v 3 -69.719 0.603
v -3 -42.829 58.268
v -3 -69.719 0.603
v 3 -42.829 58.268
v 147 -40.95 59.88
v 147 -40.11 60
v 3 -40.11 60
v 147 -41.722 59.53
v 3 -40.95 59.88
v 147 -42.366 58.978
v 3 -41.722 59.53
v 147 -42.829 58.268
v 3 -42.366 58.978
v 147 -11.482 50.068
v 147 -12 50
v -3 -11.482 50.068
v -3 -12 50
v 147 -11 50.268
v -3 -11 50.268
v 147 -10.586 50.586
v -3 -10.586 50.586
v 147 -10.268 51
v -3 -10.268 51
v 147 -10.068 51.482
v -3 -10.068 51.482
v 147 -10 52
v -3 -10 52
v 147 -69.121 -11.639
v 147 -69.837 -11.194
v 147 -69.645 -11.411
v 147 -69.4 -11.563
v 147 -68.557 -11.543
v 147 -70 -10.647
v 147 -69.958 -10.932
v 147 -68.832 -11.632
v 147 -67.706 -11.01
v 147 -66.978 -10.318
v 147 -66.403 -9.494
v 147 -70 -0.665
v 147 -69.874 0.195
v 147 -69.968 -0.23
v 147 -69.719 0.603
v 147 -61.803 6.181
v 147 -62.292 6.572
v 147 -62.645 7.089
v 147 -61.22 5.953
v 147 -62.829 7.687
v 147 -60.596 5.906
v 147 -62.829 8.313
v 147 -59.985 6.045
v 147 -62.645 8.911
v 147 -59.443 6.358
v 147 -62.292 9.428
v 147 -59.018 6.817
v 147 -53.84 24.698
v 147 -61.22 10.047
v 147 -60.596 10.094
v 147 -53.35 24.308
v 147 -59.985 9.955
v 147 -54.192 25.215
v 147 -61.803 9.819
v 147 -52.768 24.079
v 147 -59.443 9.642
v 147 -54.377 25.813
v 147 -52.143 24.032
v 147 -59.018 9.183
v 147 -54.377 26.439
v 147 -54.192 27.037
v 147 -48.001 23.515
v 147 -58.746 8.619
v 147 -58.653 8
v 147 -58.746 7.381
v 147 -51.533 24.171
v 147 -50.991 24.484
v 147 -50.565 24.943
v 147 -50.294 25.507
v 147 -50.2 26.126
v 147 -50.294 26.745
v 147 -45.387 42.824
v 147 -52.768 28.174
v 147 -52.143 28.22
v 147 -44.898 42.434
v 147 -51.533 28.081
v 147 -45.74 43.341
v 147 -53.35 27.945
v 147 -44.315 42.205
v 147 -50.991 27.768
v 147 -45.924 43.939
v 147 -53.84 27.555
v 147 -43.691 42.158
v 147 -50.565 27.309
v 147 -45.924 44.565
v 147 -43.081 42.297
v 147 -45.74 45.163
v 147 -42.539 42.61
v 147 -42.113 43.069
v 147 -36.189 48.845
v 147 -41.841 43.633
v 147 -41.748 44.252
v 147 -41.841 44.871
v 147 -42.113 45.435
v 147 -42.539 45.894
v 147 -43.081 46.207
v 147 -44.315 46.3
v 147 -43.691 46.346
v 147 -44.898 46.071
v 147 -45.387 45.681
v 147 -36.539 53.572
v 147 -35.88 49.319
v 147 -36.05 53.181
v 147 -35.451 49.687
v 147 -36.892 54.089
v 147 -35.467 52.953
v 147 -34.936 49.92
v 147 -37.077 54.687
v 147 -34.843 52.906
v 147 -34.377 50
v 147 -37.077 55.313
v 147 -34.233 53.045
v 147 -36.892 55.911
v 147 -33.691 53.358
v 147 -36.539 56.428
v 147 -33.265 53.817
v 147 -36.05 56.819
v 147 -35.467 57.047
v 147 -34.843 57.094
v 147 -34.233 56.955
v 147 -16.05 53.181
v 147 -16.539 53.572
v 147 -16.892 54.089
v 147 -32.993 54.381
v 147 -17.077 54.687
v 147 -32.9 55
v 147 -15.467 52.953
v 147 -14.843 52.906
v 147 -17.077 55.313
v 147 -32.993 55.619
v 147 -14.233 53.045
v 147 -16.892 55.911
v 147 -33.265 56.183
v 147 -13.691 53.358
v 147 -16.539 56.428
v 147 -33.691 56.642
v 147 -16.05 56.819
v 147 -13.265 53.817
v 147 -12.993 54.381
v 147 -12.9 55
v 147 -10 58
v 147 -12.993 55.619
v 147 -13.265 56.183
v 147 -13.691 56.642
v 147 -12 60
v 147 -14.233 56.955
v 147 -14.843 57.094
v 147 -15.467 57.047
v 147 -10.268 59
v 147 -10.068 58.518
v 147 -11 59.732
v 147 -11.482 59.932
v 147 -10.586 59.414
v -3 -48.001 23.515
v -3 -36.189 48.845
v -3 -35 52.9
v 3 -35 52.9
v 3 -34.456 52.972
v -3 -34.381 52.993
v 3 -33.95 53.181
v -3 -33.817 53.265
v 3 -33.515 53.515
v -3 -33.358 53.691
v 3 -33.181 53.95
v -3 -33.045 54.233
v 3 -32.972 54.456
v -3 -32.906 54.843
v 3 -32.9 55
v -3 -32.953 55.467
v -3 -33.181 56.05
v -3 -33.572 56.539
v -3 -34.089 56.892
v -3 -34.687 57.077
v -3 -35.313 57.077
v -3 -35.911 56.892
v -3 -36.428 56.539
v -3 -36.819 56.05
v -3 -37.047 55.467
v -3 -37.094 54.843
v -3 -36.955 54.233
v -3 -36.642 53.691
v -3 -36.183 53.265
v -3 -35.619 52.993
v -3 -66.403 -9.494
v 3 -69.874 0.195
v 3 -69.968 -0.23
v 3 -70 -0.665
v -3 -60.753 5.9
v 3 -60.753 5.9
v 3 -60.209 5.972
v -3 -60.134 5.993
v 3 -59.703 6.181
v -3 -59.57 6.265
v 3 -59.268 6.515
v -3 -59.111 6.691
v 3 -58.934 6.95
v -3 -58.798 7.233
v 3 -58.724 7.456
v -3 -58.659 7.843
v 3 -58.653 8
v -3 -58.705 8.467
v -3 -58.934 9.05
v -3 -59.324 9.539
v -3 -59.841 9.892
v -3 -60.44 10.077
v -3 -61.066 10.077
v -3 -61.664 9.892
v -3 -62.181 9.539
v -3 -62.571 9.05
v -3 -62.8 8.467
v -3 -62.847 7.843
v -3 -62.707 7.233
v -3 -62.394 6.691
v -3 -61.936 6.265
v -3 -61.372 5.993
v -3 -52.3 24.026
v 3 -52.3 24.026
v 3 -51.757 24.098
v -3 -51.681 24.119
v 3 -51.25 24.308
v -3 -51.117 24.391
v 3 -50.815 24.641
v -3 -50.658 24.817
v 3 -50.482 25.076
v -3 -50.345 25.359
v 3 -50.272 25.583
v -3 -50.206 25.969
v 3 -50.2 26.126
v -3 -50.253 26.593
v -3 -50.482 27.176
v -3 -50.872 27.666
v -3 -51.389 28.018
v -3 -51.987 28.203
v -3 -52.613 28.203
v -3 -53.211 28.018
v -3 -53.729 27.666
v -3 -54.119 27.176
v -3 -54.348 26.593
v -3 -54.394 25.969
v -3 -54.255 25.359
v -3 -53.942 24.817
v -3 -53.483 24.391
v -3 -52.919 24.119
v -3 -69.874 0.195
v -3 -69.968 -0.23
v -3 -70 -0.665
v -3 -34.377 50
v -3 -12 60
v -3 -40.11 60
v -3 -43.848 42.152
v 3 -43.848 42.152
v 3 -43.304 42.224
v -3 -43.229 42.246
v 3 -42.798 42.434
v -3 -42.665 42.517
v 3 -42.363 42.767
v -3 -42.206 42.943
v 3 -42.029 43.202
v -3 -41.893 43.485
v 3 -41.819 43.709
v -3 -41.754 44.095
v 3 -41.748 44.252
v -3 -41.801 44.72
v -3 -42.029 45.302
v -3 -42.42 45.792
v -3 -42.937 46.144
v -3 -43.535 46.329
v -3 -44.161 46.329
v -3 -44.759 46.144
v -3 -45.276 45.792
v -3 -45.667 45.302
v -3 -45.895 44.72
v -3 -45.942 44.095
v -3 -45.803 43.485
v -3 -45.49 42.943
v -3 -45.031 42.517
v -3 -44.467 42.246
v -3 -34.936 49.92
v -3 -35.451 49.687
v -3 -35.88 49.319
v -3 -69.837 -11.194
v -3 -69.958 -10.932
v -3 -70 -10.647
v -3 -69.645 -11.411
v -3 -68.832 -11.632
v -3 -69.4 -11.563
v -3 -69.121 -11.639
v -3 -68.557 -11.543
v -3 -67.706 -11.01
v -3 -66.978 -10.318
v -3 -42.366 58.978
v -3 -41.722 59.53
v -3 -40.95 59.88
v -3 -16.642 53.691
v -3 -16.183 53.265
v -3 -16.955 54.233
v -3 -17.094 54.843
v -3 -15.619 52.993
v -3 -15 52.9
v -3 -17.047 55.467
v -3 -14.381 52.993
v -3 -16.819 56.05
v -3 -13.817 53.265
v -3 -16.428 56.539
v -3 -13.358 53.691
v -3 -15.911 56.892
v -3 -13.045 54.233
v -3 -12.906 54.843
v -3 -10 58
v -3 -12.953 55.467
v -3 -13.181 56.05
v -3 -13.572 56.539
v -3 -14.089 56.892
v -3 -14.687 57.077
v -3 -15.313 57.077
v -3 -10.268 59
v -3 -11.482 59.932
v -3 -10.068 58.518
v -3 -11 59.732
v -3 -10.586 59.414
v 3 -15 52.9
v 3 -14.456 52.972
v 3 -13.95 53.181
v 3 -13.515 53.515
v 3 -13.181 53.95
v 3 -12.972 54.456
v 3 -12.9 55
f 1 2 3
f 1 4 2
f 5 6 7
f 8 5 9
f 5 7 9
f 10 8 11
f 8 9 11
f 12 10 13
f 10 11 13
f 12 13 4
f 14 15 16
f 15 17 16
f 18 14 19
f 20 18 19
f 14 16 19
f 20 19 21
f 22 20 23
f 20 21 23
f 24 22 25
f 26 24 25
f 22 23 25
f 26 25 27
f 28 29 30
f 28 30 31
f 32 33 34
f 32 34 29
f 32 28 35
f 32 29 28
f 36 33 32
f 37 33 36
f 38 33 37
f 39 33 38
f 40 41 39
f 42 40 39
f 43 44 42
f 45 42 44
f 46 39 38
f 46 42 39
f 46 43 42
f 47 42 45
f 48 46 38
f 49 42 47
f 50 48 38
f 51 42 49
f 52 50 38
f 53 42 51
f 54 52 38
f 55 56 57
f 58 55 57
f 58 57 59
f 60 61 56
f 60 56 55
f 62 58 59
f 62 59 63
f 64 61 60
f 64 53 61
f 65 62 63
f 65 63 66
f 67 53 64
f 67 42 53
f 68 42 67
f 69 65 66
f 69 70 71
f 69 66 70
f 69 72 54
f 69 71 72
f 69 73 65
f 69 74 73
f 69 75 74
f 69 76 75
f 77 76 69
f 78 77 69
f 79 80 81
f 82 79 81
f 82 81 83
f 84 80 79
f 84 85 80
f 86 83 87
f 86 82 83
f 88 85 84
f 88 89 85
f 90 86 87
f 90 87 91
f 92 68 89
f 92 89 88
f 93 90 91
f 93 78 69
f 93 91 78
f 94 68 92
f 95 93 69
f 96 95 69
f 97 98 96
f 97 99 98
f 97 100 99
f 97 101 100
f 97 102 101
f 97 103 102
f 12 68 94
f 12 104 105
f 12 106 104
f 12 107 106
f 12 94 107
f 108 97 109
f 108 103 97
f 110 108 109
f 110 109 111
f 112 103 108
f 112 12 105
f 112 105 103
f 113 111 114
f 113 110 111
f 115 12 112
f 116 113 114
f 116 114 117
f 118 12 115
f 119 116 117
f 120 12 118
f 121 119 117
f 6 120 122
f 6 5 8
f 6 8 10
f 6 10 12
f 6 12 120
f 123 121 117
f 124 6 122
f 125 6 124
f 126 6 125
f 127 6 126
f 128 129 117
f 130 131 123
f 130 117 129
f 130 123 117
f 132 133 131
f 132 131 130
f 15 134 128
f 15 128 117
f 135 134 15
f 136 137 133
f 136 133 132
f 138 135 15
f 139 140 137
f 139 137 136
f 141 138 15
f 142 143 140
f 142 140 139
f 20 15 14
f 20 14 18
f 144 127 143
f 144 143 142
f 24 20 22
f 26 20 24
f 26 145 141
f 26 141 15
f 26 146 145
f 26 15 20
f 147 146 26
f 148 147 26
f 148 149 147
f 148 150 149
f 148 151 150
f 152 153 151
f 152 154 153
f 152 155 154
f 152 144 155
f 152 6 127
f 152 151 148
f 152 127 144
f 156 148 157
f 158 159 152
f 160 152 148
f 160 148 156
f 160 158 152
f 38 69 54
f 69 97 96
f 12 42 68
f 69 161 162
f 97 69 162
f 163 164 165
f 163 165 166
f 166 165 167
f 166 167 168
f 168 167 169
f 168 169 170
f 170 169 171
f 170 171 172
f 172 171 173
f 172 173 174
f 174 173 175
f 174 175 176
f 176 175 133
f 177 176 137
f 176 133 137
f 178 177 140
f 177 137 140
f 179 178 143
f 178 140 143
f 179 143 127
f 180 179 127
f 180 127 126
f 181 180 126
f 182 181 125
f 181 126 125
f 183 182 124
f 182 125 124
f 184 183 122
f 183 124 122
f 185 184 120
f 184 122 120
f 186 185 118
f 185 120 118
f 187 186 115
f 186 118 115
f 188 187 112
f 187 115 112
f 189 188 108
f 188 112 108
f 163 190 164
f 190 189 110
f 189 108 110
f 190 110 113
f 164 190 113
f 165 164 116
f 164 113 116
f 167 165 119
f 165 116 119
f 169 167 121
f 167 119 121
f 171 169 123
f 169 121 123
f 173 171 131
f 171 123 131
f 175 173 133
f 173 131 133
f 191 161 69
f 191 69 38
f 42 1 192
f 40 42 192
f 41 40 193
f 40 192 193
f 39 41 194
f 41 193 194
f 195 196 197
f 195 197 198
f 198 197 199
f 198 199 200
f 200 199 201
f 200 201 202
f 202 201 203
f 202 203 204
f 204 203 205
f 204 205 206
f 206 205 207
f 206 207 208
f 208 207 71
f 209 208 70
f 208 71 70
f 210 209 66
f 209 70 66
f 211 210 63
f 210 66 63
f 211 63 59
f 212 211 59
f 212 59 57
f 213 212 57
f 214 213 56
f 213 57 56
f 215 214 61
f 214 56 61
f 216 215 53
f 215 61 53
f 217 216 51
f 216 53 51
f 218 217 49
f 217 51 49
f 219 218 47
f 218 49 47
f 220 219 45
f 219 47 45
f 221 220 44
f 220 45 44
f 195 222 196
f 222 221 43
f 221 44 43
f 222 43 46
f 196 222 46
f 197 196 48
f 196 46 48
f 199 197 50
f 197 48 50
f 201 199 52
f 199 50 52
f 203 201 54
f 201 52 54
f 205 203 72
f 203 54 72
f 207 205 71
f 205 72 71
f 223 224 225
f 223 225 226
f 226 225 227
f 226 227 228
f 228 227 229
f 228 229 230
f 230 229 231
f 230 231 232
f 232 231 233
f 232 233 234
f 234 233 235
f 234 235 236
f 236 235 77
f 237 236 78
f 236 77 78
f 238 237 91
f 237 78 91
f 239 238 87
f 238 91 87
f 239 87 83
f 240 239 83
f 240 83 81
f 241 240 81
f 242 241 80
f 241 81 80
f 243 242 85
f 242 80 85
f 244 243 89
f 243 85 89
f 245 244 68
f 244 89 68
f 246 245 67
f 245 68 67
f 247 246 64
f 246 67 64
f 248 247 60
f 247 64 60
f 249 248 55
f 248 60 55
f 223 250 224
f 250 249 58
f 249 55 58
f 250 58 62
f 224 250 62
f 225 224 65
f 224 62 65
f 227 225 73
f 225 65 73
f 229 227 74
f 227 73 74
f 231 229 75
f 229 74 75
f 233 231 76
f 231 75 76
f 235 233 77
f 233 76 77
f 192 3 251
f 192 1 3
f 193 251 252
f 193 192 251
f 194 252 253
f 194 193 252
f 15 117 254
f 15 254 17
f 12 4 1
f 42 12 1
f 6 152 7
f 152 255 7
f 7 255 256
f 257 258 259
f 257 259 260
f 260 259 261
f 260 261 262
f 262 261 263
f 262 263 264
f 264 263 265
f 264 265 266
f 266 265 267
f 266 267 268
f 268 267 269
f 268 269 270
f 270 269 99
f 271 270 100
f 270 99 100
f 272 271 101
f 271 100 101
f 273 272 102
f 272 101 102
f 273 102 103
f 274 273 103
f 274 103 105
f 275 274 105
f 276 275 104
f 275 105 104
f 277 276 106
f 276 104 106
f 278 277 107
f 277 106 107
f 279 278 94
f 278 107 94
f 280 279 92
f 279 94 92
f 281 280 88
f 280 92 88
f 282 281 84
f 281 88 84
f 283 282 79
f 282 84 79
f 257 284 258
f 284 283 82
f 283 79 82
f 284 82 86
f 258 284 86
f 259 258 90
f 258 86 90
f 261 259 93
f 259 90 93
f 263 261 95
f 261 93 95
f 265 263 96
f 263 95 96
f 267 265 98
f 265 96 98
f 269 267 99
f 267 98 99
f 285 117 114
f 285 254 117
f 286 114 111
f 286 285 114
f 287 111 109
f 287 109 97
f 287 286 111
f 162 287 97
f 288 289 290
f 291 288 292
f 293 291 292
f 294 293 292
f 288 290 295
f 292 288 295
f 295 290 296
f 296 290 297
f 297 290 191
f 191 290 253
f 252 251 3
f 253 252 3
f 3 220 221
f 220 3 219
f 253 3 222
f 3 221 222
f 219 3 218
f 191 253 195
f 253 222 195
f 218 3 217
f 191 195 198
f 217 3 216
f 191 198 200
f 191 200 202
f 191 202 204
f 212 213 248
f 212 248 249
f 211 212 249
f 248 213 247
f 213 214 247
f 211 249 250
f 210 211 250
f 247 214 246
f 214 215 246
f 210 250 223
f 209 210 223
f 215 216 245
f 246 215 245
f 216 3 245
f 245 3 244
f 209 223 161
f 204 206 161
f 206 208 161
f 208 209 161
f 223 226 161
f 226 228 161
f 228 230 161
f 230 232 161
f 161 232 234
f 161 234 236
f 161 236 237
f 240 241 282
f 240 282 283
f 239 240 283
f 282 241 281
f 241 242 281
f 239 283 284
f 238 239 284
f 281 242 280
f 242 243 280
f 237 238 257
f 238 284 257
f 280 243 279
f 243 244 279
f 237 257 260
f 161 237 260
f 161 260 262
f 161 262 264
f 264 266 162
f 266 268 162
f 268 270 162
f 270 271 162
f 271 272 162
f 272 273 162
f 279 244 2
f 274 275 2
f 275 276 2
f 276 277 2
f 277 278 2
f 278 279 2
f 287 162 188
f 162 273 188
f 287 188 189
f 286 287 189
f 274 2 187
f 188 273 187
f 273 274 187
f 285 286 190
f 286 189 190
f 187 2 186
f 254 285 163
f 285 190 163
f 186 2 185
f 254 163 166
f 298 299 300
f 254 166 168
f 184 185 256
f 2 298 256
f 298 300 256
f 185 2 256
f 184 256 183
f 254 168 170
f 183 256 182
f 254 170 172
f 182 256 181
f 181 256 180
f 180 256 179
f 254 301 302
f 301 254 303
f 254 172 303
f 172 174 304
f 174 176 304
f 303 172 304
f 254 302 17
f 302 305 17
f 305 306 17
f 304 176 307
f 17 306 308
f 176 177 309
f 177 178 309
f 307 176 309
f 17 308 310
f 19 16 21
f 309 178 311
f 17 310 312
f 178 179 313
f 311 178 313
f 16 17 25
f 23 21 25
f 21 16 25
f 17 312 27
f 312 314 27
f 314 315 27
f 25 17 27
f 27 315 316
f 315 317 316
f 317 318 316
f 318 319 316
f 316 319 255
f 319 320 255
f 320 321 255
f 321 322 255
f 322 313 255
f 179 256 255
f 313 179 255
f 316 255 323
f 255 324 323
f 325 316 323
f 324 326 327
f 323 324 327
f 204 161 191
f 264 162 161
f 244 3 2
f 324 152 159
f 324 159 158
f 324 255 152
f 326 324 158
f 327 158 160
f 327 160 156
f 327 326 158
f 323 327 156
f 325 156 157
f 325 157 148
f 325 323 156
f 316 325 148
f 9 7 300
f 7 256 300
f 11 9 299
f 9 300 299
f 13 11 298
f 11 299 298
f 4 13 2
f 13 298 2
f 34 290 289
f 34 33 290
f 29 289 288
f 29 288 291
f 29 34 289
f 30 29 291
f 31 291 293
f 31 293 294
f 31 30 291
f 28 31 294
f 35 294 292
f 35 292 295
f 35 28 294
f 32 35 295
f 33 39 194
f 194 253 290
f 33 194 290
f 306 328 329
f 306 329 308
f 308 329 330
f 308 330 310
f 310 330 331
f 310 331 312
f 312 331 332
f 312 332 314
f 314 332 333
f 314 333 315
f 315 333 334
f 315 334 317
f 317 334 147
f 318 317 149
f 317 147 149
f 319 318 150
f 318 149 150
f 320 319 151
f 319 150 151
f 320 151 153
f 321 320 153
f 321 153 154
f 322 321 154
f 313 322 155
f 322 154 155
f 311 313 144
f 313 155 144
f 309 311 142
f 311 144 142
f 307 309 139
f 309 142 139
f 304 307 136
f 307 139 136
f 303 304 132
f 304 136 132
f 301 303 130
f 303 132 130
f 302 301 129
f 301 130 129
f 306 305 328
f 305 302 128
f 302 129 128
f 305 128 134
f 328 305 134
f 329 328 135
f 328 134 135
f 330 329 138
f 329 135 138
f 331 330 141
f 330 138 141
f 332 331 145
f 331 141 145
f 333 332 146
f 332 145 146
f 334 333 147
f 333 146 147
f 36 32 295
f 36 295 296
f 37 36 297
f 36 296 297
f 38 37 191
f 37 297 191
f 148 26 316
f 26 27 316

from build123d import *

# Parameters (mm, degrees)
SKETCH_1_R               = 2.1
SKETCH_1_W               = 40.5
SKETCH_1_H               = 20.5
SKETCH_1_R_2             = 6
EXTRUDE_1_DEPTH          = 3
SKETCH_2_R               = 3
SKETCH_2_R_2             = 2.1
CUT_EXTRUDE_1_DEPTH      = 10
SKETCH_3_R               = 1.5
CUT_EXTRUDE_2_DEPTH      = 10
SKETCH_4_R               = 2.1
CUT_EXTRUDE_3_DEPTH      = 10
CHAMFER_1_SIZE           = 10
FILLET_1_R               = 3
FILLET_2_R               = 2
SKETCH_5_R               = 2.1
CUT_EXTRUDE_4_DEPTH      = 10
CUT_EXTRUDE_5_DEPTH      = 10
MOVE_START               = 3
MOVE_FACE_1_OUTLINE_R    = 2.1
MOVE_FACE_1_DEPTH        = 144
FILLET_3_R               = 2
DELETE_START             = -3
DELETE_FACE_1_DEPTH      = 150
DELETE_FACE_2_OUTLINE_R  = 2.1
DELETE_FACE_2_DEPTH      = 150
CUT_EXTRUDE_6_DEPTH      = 177.068168617
CUT_EXTRUDE_6_DEPTH_BACK = 177.068168617
FILLET_4_R               = 5
FILLET_5_R               = 1


# Read off the part's stored shape, not the designer's step: 移动面1, 删除面1, 删除面2
with BuildPart() as part:
    # 草图1 → 凸台-拉伸1 (new, symmetric)
    with BuildSketch(Plane(origin=(0, 0, 0), x_dir=(0, 0, -1), z_dir=(1, 0, 0))):
        with BuildLine():
            Line((-60, -42.021540511), (0, -70))
            Line((0, -70), (12, -70))
            Line((12, -70), (12, 30))
            Line((12, 30), (-75.715728753, 30))
            Line((-75.715728753, 30), (-125.857864376, 80.142135624))
            ThreePointArc((-125.857864376, 80.142135624), (-154.142135624, 80.142135624), (-154.142135624, 51.857864376))
            Line((-154.142135624, 51.857864376), (-92.284271247, -10))
            Line((-92.284271247, -10), (-60, -10))
            Line((-60, -10), (-60, -42.021540511))
        make_face()
        with Locations((-73.77114317, 0.625)):
            Circle(SKETCH_1_R, mode=Mode.SUBTRACT)
        with Locations((-49.02114317, 5.625)):
            Rectangle(SKETCH_1_W, SKETCH_1_H, mode=Mode.SUBTRACT)
        with Locations((-24.27114317, 0.625)):
            Circle(SKETCH_1_R, mode=Mode.SUBTRACT)
        Circle(SKETCH_1_R_2, mode=Mode.SUBTRACT)
        with Locations((-73.77114317, 10.625)):
            Circle(SKETCH_1_R, mode=Mode.SUBTRACT)
        with Locations((-24.27114317, 10.625)):
            Circle(SKETCH_1_R, mode=Mode.SUBTRACT)
    extrude(amount=EXTRUDE_1_DEPTH, both=True)

    # 草图2 → 切除-拉伸1 (cut)
    with BuildSketch(Plane(origin=(3, 0, 0), x_dir=(0, 0, -1), z_dir=(1, 0, 0))):
        with Locations((-140, 66)):
            Circle(SKETCH_2_R)
        with Locations((-140, 82)):
            Circle(SKETCH_2_R_2)
        with Locations((-126.143593539, 74)):
            Circle(SKETCH_2_R_2)
        with Locations((-126.143593539, 58)):
            Circle(SKETCH_2_R_2)
        with Locations((-140, 50)):
            Circle(SKETCH_2_R_2)
        with Locations((-153.856406461, 58)):
            Circle(SKETCH_2_R_2)
        with Locations((-153.856406461, 74)):
            Circle(SKETCH_2_R_2)
    extrude(amount=-CUT_EXTRUDE_1_DEPTH, mode=Mode.SUBTRACT)

    # 草图3 → 切除-拉伸2 (cut)
    with BuildSketch(Plane(origin=(3, 0, 0), x_dir=(0, 0, -1), z_dir=(1, 0, 0))):
        with Locations((-69.27114317, 15.875)):
            Circle(SKETCH_3_R)
        with Locations((-28.77114317, 15.875)):
            Circle(SKETCH_3_R)
        with Locations((-69.27114317, -4.625)):
            Circle(SKETCH_3_R)
        with Locations((-28.77114317, -4.625)):
            Circle(SKETCH_3_R)
    extrude(amount=-CUT_EXTRUDE_2_DEPTH, mode=Mode.SUBTRACT)

    # 草图4 → 切除-拉伸3 (cut)
    with BuildSketch(Plane(origin=(3, 0, 0), x_dir=(0, 0, -1), z_dir=(1, 0, 0))):
        with Locations((-55, -15)):
            Circle(SKETCH_4_R)
        with Locations((-55, -35)):
            Circle(SKETCH_4_R)
        with Locations((7, -65)):
            Circle(SKETCH_4_R)
        with Locations((7, -45)):
            Circle(SKETCH_4_R)
        with Locations((-8, -60.75264914)):
            Circle(SKETCH_4_R)
        with Locations((-26.126155741, -52.300283905)):
            Circle(SKETCH_4_R)
        with Locations((-44.252311481, -43.84791867)):
            Circle(SKETCH_4_R)
    extrude(amount=-CUT_EXTRUDE_3_DEPTH, mode=Mode.SUBTRACT)

    # 倒角1
    chamfer_1_edges = [part.edges().sort_by_distance(p)[0] for p in [
        (0, -10, 60),
    ]]
    chamfer(chamfer_1_edges, length=CHAMFER_1_SIZE)

    # 圆角1
    fillet_1_edges = [part.edges().sort_by_distance(p)[0] for p in [
        (0, -20, 60),
        (0, -10, 70),
        (0, 30, -12),
        (0, -70, -12),
        (0, -70, 0),
        (0, -42.021540511, 60),
        (0, -10, 92.284271247),
        (0, 30, 75.715728753),
    ]]
    fillet(fillet_1_edges, radius=FILLET_1_R)

    # 圆角2
    fillet_2_edges = [part.edges().sort_by_distance(p)[0] for p in [
        (0, 15.875, 30.27114317),
        (0, 14.375, 28.77114317),
        (0, -4.625, 67.77114317),
        (0, -3.125, 69.27114317),
        (0, -4.625, 30.27114317),
        (0, -3.125, 28.77114317),
        (0, 14.375, 69.27114317),
        (0, 15.875, 67.77114317),
    ]]
    fillet(fillet_2_edges, radius=FILLET_2_R)

    # 草图5 → 切除-拉伸4 (cut)
    with BuildSketch(Plane(origin=(3, 0, 0), x_dir=(0, 0, -1), z_dir=(1, 0, 0))):
        with Locations((-110, 57.213203436)):
            Circle(SKETCH_5_R)
        with Locations((-88.786796564, 36)):
            Circle(SKETCH_5_R)
        with Locations((-109.946763354, 14.785654888)):
            Circle(SKETCH_5_R)
        with Locations((-131.214342006, 35.94434337)):
            Circle(SKETCH_5_R)
        with Locations((-62.230447378, 25)):
            Circle(SKETCH_5_R)
        with Locations((-32.230447378, 25)):
            Circle(SKETCH_5_R)
    extrude(amount=-CUT_EXTRUDE_4_DEPTH, mode=Mode.SUBTRACT)

    # 草图6 → 切除-拉伸5 (cut)
    with BuildSketch(Plane(origin=(3, 0, 0), x_dir=(0, 0, -1), z_dir=(1, 0, 0))):
        with BuildLine():
            ThreePointArc((-60.878679656, -19.121320344), (-60.228361402, -20.09459039), (-60, -21.242640687))
            Line((-60, -21.242640687), (-60, -10))
            Line((-60, -10), (-50, -10))
            Line((-50, -10), (-50, -21.242640687))
            Line((-50, -21.242640687), (-50, -35.650837903))
            Line((-50, -35.650837903), (2.216946626, -60))
            Line((2.216946626, -60), (9, -60))
            Line((9, -60), (12, -60))
            Line((12, -60), (12, 27))
            ThreePointArc((12, 27), (11.121320344, 29.121320344), (9, 30))
            Line((9, 30), (-74.473088065, 30))
            ThreePointArc((-74.473088065, 30), (-75.621138363, 30.228361402), (-76.594408409, 30.878679656))
            Line((-76.594408409, 30.878679656), (-125.857864376, 80.142135624))
            ThreePointArc((-125.857864376, 80.142135624), (-154.142135624, 80.142135624), (-154.142135624, 51.857864376))
            Line((-154.142135624, 51.857864376), (-93.162950904, -9.121320344))
            ThreePointArc((-93.162950904, -9.121320344), (-92.189680857, -9.771638598), (-91.04163056, -10))
            Line((-91.04163056, -10), (-71.242640687, -10))
            ThreePointArc((-71.242640687, -10), (-70.09459039, -10.228361402), (-69.121320344, -10.878679656))
            Line((-69.121320344, -10.878679656), (-60.878679656, -19.121320344))
        make_face()
    extrude(amount=-CUT_EXTRUDE_5_DEPTH, mode=Mode.SUBTRACT)

    # Move Face 1 outline → Move Face 1 (add)
    with BuildSketch(Plane.YZ.offset(MOVE_START)):
        with BuildLine():
            Line((-10, 60), (-40.110329728, 60))
            ThreePointArc((-40.110329728, 60), (-41.722228553, 59.530174337), (-42.829253089, 58.267854785))
            Line((-42.829253089, 58.267854785), (-69.718923361, 0.602770797))
            ThreePointArc((-69.718923361, 0.602770797), (-69.928888021, -0.015765146), (-70, -0.665083988))
            Line((-70, -0.665083988), (-70, -9))
            ThreePointArc((-70, -9), (-69.121320344, -11.121320344), (-67, -12))
            Line((-67, -12), (-60, -12))
            Line((-60, -12), (-60, -2.216946626))
            Line((-60, -2.216946626), (-35.650837903, 50))
            Line((-35.650837903, 50), (-10, 50))
            Line((-10, 50), (-10, 60))
        make_face()
        with Locations((-65, -7)):
            Circle(MOVE_FACE_1_OUTLINE_R, mode=Mode.SUBTRACT)
        with Locations((-60.75264914, 8)):
            Circle(MOVE_FACE_1_OUTLINE_R, mode=Mode.SUBTRACT)
        with Locations((-52.300283905, 26.126155741)):
            Circle(MOVE_FACE_1_OUTLINE_R, mode=Mode.SUBTRACT)
        with Locations((-43.84791867, 44.252311481)):
            Circle(MOVE_FACE_1_OUTLINE_R, mode=Mode.SUBTRACT)
        with Locations((-35, 55)):
            Circle(MOVE_FACE_1_OUTLINE_R, mode=Mode.SUBTRACT)
        with Locations((-15, 55)):
            Circle(MOVE_FACE_1_OUTLINE_R, mode=Mode.SUBTRACT)
    extrude(amount=MOVE_FACE_1_DEPTH)

    # 圆角3
    fillet_3_edges = [part.edges().sort_by_distance(p)[0] for p in [
        (72, -60, -12),
        (75, -60, -2.216946626),
        (75, -35.650837903, 50),
        (72, -10, 50),
        (72, -10, 60),
    ]]
    fillet(fillet_3_edges, radius=FILLET_3_R)

    # Delete Face 1 outline → Delete Face 1 (add)
    with BuildSketch(Plane.YZ.offset(DELETE_START)):
        with BuildLine():
            ThreePointArc((-60, -10), (-60.585786438, -11.414213562), (-62, -12))
            Line((-62, -12), (-60, -12))
            Line((-60, -12), (-60, -10))
        make_face()
        with BuildLine():
            Line((-70, -9), (-70, -12))
            Line((-70, -12), (-67, -12))
            ThreePointArc((-67, -12), (-69.121320344, -11.121320344), (-70, -9))
        make_face()
    extrude(amount=DELETE_FACE_1_DEPTH)

    # Delete Face 2 outline → Delete Face 2 (add)
    with BuildSketch(Plane.YZ.offset(DELETE_START)):
        with Locations((-65, -7)):
            Circle(DELETE_FACE_2_OUTLINE_R)
    extrude(amount=DELETE_FACE_2_DEPTH)

    # 草图8 → 切除-拉伸6 (cut, two sides: drawn at the far end of the back side and taken through both)
    with BuildSketch(Plane(origin=(147, 0, 0), x_dir=(0, 0, -1), z_dir=(1, 0, 0)).offset(-CUT_EXTRUDE_6_DEPTH_BACK)):
        with BuildLine():
            Line((-23.515068548, -48.000964265), (12, -67.8))
            Line((12, -67.8), (12, -60))
            Line((12, -60), (2.660335952, -60))
            ThreePointArc((2.660335952, -60), (2.227456724, -59.952592014), (1.815099428, -59.812615574))
            Line((1.815099428, -59.812615574), (-23.515068548, -48.000964265))
        make_face()
    extrude(amount=CUT_EXTRUDE_6_DEPTH + CUT_EXTRUDE_6_DEPTH_BACK, mode=Mode.SUBTRACT)

    # 圆角4
    # the kernel refuses this fillet: 5 mm, written as the material it takes off along each edge
    with BuildSketch(Plane(origin=(-10.171790934, -67.8, -12), x_dir=(0, 0.4869286506241587, 0.8734417491746865), z_dir=(1, 0, 0))) as fillet_4_piece_1:
        with BuildLine():
            CenterArc((2.868716374, 5), FILLET_4_R, 218.001756319, 51.998243681)
            Line((-1.071243031, 1.921571848), (-1.150042219, 1.860003285))
            ThreePointArc((-1.150042219, 1.860003285), (-0.622965691, 0.912093059), (-0.087344175, -0.048692865))
            Line((-0.087344175, -0.048692865), (0, -0.1))
            Line((0, -0.1), (2.868716374, -0.1))
            Line((2.868716374, -0.1), (2.868716374, 0))
        make_face()
    extrude(amount=164.343581869, mode=Mode.SUBTRACT)

    # 圆角5
    fillet_5_edges = [part.edges().sort_by_distance(p)[0] for p in [
        (72, -70, -12),
    ]]
    fillet(fillet_5_edges, radius=FILLET_5_R)


solid = part.part
